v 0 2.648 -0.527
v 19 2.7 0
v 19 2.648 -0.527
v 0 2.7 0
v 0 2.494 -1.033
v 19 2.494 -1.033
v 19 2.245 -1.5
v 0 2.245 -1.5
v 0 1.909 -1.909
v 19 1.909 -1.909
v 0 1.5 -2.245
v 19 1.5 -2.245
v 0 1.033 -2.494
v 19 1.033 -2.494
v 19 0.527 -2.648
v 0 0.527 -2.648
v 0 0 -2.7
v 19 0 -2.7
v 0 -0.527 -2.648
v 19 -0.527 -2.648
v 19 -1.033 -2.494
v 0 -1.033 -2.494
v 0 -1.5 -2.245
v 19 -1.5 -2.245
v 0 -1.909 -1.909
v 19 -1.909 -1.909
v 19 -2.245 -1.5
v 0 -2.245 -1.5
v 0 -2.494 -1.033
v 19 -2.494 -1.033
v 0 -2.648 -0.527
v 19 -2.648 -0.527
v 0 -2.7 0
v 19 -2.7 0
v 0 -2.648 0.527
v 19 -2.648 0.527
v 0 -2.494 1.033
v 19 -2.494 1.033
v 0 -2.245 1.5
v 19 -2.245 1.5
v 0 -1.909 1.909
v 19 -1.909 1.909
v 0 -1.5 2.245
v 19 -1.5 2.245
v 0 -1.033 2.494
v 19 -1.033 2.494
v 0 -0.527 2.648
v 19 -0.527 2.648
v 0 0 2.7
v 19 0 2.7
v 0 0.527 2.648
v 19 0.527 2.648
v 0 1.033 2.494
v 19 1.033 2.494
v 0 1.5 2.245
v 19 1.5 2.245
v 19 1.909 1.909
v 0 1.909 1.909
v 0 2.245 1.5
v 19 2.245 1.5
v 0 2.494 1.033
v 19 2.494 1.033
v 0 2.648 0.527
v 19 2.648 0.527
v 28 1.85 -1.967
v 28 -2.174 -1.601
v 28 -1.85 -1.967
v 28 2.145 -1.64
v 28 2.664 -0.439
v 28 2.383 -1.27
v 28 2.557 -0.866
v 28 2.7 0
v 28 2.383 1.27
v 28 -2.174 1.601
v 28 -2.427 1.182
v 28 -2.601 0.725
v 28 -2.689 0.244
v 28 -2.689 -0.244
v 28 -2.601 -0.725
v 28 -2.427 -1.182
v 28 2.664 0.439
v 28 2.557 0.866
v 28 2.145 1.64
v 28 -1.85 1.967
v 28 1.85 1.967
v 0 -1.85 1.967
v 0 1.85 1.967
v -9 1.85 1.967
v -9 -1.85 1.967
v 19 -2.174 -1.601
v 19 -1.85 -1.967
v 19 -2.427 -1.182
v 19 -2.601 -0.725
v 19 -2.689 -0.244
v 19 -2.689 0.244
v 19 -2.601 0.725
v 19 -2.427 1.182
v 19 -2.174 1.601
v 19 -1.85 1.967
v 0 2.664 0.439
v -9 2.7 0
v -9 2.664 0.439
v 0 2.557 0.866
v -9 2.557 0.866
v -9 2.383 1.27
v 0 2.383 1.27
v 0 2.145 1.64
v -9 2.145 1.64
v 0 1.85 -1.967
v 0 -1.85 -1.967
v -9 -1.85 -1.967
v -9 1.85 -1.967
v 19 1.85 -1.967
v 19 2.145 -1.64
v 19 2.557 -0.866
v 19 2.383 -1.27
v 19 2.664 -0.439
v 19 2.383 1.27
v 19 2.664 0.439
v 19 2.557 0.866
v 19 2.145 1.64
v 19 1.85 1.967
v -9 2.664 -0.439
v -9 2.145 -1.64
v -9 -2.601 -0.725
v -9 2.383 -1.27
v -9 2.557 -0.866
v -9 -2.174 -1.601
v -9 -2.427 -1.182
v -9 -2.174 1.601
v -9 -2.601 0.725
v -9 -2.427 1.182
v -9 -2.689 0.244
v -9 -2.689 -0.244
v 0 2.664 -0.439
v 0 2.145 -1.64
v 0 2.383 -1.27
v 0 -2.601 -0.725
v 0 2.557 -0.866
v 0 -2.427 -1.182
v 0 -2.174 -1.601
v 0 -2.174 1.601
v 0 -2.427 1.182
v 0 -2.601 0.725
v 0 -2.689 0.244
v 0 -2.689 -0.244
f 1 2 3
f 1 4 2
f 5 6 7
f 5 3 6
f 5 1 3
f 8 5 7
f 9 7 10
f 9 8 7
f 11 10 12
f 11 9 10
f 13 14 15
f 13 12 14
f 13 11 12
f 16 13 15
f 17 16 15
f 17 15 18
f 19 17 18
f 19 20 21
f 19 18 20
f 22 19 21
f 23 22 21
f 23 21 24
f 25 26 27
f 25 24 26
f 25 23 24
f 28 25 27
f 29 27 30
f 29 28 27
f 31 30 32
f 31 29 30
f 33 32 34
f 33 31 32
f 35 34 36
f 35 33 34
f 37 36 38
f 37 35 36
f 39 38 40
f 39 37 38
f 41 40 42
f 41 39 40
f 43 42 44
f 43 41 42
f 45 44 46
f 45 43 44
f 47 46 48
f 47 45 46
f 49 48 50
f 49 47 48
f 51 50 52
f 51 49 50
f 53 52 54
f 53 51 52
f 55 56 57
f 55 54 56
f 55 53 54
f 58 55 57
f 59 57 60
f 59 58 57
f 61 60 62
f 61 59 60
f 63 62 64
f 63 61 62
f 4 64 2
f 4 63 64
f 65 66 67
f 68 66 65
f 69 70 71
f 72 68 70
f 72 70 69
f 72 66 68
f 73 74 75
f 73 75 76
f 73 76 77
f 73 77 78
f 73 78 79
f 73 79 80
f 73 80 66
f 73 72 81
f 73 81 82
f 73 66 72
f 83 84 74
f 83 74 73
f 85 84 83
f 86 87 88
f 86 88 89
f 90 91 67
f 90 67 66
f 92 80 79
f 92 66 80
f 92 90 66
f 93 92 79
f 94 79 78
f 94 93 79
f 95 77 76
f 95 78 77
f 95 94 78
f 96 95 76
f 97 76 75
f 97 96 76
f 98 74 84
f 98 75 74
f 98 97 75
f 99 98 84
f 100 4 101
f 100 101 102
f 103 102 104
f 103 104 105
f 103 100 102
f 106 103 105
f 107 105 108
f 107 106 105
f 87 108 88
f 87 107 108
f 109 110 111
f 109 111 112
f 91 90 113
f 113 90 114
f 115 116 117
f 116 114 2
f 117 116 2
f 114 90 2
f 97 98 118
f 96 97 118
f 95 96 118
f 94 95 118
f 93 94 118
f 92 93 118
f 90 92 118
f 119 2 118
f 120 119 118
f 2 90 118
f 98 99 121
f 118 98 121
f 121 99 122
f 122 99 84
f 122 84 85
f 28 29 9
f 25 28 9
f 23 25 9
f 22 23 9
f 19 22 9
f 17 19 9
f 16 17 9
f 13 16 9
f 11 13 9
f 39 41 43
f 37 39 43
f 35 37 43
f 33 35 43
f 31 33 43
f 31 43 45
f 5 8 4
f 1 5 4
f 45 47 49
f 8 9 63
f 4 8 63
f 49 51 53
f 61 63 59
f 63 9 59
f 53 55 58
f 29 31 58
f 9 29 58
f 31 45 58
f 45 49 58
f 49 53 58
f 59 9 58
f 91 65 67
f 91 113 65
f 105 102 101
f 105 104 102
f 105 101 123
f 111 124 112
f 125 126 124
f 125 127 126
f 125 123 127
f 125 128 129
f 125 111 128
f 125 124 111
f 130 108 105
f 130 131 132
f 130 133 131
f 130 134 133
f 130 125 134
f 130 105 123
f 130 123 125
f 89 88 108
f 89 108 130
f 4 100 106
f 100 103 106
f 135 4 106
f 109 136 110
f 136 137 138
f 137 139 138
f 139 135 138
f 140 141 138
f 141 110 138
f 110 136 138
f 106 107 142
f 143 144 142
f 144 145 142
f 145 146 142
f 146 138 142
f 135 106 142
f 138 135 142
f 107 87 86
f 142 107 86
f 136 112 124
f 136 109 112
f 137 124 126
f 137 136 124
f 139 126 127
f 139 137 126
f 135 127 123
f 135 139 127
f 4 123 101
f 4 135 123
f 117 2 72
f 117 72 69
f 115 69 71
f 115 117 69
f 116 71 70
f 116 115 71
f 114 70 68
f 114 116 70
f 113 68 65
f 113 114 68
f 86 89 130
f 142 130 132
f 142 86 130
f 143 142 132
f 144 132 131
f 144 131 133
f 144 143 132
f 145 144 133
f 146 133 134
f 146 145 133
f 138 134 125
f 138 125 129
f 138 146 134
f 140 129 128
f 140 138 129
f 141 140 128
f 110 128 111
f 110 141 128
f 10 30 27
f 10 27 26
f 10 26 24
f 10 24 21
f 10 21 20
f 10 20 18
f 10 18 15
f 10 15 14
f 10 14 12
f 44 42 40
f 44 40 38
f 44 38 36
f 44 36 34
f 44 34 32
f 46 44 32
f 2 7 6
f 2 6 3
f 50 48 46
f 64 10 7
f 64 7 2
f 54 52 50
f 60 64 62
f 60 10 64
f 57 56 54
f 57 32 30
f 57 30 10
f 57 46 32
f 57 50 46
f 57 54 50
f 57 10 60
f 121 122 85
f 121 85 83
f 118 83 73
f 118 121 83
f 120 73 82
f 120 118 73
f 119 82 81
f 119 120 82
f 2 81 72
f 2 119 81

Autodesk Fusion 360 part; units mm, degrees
sketch "Center" plane through (0, 0, 0) normal (1, 0, 0) x (0, 1, 0)
  circle A0 centre (0, 0) radius 2.7
  dimension "d1" = 5.4
extrude "Center width" add sketch "Center" along normal blind 19 makes body 1
sketch "Axis" plane through (19, 0, 0) normal (1, 0, 0) x (0, 1, 0)
  circle A0 centre (0, 0) radius 2.7
  line L0 (-1.85, 1.9666) -> (1.85, 1.9666)
  line L1 (1.85, -1.9666) -> (-1.85, -1.9666)
  arc A1 (-1.85, 1.9666) -> (-1.85, -1.9666) centre (0, 0) ccw
  arc A2 (1.85, -1.9666) -> (1.85, 1.9666) centre (0, 0) ccw
  dimension "d4" = 5.4
  dimension "d5" = 3.7
extrude "Axis width" add sketch "Axis" along normal blind 9 separate body contours A0 L0 L1 A1 A2 makes body 2
ref_plane "WorkPlane1" through (9.5, 0, 0) normal (1, 0, 0) x (0, 1, 0)
mirror "Axis mirror" about plane through (9.5, 0, 0) normal (1, 0, 0) of "Axis width" makes body 3
equation "d8 = ( 19 / 2 ) * 1 mm"
